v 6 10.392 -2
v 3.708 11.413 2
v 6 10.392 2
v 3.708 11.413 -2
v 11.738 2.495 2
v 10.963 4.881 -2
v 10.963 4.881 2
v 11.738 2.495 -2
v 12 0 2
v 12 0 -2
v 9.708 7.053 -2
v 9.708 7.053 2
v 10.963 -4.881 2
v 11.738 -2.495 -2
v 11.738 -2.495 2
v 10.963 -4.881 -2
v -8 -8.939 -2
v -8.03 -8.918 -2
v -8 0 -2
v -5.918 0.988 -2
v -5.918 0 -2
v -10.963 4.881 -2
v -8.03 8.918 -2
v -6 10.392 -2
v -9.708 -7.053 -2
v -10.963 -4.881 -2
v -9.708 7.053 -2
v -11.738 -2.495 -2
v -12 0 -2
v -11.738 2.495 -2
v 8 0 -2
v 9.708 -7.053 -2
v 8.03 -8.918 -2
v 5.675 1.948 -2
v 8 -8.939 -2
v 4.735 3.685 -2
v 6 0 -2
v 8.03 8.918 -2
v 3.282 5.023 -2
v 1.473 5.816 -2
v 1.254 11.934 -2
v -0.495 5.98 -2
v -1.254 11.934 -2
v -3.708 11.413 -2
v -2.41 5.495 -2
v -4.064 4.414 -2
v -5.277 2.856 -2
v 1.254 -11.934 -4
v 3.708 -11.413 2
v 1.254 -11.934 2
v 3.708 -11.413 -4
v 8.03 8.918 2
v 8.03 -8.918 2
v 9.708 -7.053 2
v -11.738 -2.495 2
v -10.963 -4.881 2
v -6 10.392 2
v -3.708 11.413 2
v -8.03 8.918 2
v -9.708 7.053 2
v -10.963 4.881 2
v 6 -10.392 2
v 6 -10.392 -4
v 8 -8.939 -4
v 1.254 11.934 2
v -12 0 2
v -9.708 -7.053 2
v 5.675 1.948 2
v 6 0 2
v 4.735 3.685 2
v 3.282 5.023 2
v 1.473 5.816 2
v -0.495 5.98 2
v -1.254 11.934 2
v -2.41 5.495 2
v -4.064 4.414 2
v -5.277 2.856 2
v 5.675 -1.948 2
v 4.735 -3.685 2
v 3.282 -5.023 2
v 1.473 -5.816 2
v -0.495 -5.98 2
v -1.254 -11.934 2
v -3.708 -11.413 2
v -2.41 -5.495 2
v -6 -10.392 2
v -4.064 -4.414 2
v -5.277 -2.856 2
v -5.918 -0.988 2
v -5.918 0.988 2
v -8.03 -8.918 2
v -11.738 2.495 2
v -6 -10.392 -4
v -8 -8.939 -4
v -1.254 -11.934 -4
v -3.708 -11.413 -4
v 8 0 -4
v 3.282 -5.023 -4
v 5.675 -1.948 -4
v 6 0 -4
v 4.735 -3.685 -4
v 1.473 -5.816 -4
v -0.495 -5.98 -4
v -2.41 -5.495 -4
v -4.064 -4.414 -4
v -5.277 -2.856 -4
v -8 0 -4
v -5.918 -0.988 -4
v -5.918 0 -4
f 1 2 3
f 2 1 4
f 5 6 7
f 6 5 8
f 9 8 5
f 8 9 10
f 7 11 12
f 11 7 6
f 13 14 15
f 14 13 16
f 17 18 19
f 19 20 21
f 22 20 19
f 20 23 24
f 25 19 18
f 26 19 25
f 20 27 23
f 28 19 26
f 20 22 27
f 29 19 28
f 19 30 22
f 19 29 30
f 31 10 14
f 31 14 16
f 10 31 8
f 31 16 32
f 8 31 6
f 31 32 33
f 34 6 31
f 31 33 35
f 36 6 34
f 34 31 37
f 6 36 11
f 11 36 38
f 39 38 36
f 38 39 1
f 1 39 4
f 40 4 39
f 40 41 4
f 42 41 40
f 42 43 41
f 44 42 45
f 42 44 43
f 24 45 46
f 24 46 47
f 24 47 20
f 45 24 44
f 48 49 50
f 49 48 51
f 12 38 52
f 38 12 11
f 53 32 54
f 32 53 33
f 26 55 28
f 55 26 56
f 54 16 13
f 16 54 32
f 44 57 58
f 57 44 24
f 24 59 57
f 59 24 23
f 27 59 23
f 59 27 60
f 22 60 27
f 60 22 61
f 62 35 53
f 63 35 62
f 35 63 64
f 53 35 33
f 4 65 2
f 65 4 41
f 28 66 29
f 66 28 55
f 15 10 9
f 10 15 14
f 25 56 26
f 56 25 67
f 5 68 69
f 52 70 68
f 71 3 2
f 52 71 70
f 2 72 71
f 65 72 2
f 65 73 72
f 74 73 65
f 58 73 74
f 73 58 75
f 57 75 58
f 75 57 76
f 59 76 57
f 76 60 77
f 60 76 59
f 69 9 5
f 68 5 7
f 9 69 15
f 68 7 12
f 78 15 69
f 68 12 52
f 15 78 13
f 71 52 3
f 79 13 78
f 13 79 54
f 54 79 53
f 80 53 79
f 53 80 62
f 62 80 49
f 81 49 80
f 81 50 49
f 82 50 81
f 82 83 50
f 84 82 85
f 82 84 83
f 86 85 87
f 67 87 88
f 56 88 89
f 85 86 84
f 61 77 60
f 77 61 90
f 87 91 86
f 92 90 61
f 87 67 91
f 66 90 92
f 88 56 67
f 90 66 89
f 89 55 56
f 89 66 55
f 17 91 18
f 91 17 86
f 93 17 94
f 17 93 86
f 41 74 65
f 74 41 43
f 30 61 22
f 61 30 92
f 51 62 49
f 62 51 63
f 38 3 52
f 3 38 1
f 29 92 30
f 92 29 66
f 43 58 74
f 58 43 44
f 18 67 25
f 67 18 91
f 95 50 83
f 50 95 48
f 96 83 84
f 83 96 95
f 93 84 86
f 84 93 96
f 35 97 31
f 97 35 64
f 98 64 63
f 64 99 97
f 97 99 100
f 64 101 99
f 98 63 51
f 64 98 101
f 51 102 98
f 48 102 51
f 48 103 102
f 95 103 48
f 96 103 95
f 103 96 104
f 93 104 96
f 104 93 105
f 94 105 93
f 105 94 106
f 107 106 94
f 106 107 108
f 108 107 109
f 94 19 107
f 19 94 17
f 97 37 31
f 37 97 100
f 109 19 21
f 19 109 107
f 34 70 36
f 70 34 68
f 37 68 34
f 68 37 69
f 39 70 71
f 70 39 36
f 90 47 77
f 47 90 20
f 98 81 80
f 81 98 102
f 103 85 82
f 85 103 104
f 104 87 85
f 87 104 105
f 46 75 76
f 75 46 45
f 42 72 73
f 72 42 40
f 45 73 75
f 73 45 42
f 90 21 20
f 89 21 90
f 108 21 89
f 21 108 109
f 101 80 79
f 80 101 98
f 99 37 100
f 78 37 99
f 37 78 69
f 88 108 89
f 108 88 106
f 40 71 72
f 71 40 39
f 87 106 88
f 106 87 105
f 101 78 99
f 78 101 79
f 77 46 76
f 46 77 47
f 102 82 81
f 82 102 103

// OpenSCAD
// Washer for attaching down-tube pump mount
difference(){
    union(){
        cylinder(h=4, r=12, center=true);
        translate([0,-10,-2]){
            cube([16, 20, 4], center=true);
        }
    }
    union(){
        cylinder(h=12, r=6, center=true);
        difference(){
            cylinder(h=12, r=24, center=true);
            cylinder(h=16, r=12, center=true);
        }
    }
}
